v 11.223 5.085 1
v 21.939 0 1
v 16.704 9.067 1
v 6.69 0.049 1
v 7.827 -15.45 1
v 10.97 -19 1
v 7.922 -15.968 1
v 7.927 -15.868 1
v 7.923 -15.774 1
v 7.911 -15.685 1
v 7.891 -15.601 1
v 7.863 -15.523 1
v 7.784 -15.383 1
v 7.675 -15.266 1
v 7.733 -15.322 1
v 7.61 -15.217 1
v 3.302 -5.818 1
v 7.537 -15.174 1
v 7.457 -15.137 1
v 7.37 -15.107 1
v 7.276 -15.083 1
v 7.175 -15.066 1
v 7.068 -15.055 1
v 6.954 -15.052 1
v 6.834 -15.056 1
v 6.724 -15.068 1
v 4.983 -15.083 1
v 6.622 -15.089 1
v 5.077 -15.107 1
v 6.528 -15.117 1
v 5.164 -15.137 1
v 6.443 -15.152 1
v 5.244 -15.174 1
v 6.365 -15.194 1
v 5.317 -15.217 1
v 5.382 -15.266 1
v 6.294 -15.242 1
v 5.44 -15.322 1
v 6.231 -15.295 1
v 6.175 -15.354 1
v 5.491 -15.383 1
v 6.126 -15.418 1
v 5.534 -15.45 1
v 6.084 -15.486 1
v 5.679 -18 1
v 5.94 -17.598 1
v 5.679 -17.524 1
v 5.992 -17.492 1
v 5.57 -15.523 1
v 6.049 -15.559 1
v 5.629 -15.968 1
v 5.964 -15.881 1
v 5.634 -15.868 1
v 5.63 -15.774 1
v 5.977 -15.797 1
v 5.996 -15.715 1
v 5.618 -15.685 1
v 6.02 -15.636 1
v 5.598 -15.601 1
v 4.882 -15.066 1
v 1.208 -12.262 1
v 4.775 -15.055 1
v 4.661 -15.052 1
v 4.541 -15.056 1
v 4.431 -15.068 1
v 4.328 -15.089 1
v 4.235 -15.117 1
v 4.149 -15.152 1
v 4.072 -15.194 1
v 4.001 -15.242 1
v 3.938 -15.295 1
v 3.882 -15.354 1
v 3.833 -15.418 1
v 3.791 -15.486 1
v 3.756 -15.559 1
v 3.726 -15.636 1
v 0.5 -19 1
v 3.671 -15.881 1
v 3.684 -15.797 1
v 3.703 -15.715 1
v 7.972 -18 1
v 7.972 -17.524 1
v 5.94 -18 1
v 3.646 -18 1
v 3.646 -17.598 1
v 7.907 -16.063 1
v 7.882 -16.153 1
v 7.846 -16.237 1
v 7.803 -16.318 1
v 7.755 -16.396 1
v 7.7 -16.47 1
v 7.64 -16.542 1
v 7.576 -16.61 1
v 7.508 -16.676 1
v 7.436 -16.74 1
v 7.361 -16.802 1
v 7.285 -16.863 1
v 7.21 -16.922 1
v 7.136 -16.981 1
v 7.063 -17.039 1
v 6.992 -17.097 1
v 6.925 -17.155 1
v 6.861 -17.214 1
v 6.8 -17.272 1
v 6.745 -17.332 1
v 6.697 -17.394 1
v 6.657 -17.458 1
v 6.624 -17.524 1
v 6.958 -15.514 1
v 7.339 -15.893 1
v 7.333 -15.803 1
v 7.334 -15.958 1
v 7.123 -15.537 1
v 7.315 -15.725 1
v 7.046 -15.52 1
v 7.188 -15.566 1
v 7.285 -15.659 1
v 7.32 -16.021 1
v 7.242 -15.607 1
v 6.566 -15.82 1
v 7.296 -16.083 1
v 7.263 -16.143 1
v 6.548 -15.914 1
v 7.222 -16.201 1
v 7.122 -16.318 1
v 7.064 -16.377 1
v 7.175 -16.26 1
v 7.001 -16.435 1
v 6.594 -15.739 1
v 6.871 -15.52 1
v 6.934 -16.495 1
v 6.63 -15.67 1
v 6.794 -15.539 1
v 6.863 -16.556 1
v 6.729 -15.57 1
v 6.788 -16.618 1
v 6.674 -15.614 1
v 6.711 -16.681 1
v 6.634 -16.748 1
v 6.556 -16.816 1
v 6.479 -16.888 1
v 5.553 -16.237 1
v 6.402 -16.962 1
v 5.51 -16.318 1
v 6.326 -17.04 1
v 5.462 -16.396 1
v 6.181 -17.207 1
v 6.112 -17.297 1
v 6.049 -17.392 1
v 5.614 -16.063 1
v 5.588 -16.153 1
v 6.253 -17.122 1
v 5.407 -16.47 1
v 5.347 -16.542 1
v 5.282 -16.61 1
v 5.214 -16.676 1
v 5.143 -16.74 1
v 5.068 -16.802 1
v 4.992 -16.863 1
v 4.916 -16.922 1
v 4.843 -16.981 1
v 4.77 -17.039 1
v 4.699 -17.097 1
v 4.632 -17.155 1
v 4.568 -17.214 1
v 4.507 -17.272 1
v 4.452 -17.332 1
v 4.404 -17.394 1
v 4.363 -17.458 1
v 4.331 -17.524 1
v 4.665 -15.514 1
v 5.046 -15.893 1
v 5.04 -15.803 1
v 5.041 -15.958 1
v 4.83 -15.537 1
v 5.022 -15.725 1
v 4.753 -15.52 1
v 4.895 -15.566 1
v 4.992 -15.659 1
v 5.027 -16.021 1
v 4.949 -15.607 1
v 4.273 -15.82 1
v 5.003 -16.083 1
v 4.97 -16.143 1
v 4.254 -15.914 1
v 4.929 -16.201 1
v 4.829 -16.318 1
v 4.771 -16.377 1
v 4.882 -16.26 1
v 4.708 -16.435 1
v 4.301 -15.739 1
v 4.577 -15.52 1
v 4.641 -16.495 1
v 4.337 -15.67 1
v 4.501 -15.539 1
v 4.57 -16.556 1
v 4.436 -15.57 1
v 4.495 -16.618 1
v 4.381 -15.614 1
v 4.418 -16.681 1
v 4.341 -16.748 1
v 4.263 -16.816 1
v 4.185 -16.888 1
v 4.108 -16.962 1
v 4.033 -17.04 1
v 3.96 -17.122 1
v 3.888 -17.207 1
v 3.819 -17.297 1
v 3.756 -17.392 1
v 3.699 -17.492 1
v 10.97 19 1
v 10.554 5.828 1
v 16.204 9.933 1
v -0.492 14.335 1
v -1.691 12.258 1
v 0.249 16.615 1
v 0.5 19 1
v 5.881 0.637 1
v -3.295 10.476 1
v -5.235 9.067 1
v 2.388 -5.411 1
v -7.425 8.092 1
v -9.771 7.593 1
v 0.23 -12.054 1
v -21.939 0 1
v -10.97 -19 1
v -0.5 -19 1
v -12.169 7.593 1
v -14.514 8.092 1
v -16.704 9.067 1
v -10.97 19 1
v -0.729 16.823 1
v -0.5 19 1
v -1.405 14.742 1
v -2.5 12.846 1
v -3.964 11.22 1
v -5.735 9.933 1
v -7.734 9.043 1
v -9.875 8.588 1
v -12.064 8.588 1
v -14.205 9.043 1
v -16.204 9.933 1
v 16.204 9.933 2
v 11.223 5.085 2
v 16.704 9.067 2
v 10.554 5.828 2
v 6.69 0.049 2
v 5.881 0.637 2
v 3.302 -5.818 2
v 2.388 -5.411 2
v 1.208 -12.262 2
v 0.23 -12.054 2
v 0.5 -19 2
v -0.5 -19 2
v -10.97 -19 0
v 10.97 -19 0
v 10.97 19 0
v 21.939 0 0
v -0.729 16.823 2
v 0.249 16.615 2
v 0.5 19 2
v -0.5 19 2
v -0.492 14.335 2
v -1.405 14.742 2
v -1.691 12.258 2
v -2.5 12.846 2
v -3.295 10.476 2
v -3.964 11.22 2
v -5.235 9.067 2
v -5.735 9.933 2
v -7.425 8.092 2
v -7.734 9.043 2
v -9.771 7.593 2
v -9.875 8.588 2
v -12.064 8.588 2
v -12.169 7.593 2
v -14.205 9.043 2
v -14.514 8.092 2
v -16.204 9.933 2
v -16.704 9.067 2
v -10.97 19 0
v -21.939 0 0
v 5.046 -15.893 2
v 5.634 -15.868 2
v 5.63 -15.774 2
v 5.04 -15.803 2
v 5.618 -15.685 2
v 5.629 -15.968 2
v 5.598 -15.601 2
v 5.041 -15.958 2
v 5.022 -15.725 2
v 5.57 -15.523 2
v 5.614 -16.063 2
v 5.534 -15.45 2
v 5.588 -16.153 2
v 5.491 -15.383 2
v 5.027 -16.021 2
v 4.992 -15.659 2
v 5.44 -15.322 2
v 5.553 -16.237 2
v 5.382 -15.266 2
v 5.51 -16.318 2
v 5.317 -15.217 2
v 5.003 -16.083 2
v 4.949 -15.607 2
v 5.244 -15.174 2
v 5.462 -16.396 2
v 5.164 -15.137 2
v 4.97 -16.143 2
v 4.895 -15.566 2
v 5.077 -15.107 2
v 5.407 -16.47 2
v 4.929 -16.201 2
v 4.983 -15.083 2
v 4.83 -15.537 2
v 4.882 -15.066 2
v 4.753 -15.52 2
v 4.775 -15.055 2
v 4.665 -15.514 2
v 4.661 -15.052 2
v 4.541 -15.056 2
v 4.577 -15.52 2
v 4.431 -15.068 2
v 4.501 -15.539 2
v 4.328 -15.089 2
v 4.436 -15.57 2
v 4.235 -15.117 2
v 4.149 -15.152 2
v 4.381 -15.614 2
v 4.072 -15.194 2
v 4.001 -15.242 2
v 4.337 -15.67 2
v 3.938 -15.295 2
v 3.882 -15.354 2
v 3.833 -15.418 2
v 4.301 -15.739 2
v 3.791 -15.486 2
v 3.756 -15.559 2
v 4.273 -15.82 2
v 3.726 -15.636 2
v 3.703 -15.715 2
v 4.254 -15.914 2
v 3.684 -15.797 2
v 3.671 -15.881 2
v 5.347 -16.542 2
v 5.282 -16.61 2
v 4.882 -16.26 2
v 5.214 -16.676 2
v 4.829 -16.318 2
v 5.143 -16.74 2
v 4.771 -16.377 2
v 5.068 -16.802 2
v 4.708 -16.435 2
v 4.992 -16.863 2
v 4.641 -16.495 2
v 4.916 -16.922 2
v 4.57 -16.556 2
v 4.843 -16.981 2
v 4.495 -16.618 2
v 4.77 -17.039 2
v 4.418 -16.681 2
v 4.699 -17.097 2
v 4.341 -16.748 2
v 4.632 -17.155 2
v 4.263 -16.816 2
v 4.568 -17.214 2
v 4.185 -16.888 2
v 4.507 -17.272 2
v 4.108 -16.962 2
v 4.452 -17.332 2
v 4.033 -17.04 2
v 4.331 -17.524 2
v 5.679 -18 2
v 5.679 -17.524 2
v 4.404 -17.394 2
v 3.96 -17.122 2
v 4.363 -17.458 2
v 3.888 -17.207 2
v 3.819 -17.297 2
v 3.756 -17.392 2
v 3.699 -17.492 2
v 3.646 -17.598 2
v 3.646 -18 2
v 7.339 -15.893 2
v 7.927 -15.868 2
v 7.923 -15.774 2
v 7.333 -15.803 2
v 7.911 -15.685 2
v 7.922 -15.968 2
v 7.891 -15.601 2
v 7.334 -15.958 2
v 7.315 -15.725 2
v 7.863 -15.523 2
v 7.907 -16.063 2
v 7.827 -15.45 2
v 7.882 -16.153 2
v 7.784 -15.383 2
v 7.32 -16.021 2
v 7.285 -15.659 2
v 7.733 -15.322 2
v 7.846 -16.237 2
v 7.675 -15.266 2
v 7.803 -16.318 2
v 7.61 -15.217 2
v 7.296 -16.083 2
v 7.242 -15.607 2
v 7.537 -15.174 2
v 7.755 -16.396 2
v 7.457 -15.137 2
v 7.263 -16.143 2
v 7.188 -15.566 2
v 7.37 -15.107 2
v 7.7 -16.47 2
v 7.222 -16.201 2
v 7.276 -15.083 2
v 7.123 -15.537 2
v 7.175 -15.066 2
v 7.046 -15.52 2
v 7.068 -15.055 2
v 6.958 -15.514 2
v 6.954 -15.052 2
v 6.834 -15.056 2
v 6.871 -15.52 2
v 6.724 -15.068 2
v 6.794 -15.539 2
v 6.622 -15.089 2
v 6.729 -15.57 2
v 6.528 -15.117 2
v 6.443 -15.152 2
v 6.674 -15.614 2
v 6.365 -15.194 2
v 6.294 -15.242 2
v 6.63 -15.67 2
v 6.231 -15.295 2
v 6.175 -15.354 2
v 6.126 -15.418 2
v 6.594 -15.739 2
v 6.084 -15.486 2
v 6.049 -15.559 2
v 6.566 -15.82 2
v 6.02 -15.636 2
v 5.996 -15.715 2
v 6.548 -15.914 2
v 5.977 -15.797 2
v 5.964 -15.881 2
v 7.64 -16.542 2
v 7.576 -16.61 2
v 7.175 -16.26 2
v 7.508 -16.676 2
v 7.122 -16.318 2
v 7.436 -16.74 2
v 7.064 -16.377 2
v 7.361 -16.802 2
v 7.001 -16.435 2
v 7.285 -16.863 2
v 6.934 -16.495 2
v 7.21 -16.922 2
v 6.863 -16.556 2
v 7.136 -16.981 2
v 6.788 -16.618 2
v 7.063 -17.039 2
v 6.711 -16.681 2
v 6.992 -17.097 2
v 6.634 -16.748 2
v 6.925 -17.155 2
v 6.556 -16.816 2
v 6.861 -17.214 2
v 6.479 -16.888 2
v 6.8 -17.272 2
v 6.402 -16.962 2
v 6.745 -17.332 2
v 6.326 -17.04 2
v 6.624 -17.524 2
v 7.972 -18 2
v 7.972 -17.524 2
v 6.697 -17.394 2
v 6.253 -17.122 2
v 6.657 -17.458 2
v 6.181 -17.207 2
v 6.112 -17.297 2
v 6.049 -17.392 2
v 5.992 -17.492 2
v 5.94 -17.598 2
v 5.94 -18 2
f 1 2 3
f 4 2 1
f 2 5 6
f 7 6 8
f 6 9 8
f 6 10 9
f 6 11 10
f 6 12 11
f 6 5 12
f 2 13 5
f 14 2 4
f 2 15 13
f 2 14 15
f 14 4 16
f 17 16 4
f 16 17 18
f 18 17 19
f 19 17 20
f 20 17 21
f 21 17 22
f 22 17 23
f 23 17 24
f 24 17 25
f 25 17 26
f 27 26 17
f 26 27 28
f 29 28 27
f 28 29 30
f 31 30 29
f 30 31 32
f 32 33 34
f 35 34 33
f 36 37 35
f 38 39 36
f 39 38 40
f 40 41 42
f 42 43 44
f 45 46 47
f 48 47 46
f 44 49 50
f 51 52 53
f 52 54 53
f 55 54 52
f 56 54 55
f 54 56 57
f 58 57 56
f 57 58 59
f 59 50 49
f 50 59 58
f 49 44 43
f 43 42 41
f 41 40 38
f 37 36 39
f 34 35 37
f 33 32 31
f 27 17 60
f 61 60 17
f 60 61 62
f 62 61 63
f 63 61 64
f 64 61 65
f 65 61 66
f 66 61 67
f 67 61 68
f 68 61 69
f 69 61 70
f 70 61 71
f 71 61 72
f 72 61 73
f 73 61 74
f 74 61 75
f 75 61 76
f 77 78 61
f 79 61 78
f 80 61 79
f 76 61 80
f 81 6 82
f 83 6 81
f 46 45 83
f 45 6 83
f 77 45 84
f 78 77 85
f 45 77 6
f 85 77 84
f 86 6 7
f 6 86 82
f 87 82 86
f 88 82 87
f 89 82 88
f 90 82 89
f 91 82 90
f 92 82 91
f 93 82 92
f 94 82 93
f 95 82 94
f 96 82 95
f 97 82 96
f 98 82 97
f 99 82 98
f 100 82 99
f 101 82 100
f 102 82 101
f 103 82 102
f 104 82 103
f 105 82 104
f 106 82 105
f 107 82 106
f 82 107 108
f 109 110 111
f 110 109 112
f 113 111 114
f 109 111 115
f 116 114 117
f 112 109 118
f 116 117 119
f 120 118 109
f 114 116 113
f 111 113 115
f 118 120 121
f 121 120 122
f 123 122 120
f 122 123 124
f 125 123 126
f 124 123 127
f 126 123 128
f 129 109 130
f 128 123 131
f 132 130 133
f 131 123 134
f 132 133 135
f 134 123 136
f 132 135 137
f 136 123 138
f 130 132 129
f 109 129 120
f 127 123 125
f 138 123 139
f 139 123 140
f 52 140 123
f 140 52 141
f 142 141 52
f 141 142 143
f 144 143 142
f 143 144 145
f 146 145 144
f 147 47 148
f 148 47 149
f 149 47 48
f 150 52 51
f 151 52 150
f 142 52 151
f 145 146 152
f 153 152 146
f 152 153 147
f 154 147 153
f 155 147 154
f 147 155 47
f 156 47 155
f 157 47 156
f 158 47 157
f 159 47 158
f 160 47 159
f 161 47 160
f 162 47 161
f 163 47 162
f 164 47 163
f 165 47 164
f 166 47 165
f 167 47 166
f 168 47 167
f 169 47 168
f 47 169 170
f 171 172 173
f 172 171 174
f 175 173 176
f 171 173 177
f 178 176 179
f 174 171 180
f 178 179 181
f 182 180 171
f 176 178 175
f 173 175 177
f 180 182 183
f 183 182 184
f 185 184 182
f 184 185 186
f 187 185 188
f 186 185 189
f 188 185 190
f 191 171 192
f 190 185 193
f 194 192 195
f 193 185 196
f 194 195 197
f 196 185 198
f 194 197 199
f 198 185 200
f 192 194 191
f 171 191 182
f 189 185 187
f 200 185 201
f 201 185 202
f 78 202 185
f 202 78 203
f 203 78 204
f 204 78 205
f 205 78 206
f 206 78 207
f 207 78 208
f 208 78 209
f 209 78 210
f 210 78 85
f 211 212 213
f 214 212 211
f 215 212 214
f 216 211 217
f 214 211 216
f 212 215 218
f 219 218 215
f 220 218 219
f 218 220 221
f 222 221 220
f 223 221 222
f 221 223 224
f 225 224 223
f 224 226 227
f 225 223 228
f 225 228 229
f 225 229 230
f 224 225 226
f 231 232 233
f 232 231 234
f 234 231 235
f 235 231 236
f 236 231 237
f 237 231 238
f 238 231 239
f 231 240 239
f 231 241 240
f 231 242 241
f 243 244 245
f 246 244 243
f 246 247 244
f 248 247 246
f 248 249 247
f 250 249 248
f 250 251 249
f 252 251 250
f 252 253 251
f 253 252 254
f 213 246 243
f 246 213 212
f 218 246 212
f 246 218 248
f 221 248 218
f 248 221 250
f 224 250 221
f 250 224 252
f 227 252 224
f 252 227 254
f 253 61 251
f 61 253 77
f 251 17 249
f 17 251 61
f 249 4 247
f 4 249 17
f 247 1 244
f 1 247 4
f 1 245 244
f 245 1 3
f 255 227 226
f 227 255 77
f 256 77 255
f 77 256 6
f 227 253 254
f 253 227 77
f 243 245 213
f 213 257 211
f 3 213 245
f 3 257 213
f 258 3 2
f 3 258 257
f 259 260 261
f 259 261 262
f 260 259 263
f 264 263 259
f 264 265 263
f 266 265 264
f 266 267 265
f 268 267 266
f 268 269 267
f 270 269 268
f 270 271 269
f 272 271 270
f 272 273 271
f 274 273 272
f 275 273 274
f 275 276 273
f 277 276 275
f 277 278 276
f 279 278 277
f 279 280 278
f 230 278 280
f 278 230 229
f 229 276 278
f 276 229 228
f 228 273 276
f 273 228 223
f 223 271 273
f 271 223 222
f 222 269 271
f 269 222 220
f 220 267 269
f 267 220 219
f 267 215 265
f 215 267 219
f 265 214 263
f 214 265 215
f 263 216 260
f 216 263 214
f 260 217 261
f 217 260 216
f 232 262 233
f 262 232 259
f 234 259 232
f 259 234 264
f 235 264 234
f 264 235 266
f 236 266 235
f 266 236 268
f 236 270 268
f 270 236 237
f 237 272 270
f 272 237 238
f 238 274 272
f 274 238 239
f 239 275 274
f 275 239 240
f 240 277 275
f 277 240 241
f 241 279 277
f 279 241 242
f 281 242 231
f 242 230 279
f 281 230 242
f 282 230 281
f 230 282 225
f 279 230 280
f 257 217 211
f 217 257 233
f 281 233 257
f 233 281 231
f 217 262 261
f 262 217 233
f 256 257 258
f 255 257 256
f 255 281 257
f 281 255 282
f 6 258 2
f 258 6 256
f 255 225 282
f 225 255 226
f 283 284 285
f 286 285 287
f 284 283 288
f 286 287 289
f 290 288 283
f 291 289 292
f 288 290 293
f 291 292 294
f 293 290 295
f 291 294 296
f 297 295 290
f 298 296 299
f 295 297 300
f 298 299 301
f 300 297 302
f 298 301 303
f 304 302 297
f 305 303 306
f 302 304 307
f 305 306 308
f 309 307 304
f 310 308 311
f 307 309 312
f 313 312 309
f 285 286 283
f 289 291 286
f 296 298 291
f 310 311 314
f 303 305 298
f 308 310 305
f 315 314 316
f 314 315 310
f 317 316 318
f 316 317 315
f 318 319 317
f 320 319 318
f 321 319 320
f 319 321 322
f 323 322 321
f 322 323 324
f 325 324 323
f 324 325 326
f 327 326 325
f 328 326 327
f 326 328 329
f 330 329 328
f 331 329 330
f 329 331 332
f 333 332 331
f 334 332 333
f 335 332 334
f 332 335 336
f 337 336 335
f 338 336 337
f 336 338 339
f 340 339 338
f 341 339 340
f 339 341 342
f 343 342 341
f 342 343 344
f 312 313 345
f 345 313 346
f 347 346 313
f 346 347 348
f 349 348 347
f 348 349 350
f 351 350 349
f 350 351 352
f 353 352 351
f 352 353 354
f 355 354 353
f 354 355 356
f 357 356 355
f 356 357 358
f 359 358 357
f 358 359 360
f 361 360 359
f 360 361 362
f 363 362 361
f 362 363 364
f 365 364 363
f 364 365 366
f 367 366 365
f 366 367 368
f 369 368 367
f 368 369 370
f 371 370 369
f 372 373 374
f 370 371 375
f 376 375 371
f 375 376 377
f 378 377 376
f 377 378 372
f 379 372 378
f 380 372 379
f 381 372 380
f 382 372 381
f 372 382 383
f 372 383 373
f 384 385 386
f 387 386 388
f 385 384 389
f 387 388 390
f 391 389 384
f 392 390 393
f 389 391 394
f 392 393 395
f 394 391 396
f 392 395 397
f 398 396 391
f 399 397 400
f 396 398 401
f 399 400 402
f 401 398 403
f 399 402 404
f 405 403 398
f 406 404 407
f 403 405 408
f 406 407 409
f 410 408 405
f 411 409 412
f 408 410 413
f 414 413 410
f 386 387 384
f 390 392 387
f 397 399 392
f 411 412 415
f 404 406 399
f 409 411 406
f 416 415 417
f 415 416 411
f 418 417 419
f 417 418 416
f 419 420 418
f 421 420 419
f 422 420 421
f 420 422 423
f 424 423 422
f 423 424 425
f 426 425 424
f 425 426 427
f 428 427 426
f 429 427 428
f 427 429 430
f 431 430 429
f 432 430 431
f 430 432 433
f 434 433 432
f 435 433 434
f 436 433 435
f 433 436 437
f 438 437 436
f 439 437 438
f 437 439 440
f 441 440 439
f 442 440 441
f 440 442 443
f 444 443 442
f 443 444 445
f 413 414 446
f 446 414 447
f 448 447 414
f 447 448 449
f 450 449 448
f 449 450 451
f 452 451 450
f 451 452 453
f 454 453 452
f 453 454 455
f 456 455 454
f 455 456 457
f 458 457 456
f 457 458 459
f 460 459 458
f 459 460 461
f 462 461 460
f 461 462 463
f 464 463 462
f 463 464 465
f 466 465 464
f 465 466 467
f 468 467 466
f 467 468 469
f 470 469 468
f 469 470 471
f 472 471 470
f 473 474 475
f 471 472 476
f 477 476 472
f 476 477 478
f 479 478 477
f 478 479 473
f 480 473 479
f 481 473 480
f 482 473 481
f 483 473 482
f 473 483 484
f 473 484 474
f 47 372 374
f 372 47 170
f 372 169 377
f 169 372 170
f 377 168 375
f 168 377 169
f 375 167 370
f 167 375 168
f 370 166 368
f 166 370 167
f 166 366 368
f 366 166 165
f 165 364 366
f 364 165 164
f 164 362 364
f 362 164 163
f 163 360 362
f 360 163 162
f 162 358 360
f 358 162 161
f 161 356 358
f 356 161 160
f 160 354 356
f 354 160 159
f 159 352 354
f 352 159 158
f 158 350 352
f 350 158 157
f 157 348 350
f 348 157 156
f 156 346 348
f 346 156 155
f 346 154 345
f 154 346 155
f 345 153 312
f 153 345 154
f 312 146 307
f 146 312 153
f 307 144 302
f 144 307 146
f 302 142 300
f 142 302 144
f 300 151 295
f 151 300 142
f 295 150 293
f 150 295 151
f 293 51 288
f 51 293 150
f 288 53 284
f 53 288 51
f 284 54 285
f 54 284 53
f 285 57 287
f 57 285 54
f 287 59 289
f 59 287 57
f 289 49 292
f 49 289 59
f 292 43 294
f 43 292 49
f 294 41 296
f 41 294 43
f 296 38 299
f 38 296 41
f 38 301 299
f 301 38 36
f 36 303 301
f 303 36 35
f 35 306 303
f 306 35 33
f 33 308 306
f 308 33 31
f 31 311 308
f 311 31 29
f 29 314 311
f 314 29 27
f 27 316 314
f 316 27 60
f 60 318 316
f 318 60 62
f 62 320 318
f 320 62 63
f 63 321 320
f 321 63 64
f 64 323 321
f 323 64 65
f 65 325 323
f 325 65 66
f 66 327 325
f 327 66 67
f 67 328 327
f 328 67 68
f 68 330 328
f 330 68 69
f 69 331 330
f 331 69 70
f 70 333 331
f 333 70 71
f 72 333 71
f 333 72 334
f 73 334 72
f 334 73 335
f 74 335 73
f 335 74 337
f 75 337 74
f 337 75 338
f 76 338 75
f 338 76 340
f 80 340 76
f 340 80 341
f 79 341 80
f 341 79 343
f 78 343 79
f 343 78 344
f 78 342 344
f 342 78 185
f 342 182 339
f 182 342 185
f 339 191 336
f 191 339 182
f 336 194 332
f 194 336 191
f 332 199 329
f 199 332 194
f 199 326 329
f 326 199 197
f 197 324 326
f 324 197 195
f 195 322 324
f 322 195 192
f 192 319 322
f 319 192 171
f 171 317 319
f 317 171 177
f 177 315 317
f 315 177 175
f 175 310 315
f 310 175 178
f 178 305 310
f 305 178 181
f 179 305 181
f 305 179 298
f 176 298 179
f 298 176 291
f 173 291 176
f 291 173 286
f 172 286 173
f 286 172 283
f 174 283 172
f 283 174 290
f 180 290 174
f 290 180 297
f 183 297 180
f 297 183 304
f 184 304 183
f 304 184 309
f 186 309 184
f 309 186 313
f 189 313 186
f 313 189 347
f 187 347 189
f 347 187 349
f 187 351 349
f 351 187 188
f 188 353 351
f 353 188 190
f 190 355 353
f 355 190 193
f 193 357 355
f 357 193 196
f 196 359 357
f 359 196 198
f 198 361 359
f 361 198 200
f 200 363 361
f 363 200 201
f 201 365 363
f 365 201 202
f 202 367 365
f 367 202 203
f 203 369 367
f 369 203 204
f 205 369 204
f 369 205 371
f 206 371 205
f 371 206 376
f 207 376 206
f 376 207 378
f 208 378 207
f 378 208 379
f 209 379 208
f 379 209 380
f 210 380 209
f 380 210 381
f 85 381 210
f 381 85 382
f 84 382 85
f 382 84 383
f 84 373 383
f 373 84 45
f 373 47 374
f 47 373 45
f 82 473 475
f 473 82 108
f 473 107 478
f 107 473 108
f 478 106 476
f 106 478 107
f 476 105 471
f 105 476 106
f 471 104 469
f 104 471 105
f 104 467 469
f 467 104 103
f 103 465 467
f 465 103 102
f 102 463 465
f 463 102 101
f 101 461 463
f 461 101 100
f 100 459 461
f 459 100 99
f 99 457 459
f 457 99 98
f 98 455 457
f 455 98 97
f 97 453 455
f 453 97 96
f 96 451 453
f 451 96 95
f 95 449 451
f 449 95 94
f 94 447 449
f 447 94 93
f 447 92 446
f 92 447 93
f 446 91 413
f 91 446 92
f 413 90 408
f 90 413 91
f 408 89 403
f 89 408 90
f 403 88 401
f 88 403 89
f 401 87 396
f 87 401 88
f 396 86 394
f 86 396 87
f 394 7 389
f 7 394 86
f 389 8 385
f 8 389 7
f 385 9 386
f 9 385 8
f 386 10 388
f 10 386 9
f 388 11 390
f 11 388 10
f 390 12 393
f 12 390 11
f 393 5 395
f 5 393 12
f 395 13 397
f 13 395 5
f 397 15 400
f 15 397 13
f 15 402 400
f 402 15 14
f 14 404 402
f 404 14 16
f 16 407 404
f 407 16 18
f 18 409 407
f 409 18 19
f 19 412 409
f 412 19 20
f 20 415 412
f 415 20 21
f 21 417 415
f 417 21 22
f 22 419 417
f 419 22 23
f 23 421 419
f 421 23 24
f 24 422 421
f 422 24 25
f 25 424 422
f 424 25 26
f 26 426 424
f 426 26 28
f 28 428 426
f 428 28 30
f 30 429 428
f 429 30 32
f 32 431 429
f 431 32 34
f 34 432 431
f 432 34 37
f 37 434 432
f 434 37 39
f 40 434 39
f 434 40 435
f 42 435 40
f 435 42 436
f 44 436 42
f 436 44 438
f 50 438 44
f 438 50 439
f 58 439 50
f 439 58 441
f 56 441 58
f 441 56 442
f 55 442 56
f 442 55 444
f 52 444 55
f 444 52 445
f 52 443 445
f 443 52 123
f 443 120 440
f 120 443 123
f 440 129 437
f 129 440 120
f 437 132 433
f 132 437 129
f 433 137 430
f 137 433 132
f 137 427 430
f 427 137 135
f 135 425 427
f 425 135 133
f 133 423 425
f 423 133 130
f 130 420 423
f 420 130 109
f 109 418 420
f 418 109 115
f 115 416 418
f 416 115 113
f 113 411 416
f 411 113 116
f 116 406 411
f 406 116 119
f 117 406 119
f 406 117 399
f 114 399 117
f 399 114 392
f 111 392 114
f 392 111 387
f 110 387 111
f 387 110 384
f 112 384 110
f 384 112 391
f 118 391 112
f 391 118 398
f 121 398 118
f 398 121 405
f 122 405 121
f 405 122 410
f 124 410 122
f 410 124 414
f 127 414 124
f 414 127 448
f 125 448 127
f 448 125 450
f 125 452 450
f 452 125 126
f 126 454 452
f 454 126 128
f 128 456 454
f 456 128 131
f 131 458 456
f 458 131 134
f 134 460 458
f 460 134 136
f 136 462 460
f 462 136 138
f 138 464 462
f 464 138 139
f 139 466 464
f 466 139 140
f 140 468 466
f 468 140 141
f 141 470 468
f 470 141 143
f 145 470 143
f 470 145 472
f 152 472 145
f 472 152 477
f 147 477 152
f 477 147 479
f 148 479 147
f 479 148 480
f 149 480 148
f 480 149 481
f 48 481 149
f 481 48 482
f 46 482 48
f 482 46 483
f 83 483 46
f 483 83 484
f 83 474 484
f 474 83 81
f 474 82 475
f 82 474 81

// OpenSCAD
include <../Scripts/18xx tiles basic functions.scad>
hex("Green");
put_tilenr("22");
light_curve(r=0);
sharp_curve(r=3);
